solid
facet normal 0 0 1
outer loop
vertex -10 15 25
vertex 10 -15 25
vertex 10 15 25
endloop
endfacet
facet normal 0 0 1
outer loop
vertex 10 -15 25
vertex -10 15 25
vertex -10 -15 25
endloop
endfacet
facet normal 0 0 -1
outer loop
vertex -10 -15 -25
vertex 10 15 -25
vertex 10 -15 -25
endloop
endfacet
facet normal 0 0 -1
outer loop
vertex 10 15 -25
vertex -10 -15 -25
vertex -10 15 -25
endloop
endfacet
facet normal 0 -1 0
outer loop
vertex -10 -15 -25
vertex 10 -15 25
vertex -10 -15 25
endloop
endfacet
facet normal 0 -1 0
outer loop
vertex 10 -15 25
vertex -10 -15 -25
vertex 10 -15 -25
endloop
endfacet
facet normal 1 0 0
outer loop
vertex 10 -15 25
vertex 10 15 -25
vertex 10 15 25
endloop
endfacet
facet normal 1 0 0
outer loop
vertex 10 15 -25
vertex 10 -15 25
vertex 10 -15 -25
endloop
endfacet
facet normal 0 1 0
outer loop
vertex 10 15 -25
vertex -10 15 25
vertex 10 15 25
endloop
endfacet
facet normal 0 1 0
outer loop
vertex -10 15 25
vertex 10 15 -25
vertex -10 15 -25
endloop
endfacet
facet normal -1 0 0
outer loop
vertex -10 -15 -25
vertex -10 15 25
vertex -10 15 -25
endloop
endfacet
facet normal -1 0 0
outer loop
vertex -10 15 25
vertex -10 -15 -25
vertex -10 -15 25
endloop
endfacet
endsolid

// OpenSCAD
// creación de un cubo con la función cube() utilizando vector de entrada de tres parametros (x,y,z) y con centro en el inicio.
cube([20,30,50],center=true);
